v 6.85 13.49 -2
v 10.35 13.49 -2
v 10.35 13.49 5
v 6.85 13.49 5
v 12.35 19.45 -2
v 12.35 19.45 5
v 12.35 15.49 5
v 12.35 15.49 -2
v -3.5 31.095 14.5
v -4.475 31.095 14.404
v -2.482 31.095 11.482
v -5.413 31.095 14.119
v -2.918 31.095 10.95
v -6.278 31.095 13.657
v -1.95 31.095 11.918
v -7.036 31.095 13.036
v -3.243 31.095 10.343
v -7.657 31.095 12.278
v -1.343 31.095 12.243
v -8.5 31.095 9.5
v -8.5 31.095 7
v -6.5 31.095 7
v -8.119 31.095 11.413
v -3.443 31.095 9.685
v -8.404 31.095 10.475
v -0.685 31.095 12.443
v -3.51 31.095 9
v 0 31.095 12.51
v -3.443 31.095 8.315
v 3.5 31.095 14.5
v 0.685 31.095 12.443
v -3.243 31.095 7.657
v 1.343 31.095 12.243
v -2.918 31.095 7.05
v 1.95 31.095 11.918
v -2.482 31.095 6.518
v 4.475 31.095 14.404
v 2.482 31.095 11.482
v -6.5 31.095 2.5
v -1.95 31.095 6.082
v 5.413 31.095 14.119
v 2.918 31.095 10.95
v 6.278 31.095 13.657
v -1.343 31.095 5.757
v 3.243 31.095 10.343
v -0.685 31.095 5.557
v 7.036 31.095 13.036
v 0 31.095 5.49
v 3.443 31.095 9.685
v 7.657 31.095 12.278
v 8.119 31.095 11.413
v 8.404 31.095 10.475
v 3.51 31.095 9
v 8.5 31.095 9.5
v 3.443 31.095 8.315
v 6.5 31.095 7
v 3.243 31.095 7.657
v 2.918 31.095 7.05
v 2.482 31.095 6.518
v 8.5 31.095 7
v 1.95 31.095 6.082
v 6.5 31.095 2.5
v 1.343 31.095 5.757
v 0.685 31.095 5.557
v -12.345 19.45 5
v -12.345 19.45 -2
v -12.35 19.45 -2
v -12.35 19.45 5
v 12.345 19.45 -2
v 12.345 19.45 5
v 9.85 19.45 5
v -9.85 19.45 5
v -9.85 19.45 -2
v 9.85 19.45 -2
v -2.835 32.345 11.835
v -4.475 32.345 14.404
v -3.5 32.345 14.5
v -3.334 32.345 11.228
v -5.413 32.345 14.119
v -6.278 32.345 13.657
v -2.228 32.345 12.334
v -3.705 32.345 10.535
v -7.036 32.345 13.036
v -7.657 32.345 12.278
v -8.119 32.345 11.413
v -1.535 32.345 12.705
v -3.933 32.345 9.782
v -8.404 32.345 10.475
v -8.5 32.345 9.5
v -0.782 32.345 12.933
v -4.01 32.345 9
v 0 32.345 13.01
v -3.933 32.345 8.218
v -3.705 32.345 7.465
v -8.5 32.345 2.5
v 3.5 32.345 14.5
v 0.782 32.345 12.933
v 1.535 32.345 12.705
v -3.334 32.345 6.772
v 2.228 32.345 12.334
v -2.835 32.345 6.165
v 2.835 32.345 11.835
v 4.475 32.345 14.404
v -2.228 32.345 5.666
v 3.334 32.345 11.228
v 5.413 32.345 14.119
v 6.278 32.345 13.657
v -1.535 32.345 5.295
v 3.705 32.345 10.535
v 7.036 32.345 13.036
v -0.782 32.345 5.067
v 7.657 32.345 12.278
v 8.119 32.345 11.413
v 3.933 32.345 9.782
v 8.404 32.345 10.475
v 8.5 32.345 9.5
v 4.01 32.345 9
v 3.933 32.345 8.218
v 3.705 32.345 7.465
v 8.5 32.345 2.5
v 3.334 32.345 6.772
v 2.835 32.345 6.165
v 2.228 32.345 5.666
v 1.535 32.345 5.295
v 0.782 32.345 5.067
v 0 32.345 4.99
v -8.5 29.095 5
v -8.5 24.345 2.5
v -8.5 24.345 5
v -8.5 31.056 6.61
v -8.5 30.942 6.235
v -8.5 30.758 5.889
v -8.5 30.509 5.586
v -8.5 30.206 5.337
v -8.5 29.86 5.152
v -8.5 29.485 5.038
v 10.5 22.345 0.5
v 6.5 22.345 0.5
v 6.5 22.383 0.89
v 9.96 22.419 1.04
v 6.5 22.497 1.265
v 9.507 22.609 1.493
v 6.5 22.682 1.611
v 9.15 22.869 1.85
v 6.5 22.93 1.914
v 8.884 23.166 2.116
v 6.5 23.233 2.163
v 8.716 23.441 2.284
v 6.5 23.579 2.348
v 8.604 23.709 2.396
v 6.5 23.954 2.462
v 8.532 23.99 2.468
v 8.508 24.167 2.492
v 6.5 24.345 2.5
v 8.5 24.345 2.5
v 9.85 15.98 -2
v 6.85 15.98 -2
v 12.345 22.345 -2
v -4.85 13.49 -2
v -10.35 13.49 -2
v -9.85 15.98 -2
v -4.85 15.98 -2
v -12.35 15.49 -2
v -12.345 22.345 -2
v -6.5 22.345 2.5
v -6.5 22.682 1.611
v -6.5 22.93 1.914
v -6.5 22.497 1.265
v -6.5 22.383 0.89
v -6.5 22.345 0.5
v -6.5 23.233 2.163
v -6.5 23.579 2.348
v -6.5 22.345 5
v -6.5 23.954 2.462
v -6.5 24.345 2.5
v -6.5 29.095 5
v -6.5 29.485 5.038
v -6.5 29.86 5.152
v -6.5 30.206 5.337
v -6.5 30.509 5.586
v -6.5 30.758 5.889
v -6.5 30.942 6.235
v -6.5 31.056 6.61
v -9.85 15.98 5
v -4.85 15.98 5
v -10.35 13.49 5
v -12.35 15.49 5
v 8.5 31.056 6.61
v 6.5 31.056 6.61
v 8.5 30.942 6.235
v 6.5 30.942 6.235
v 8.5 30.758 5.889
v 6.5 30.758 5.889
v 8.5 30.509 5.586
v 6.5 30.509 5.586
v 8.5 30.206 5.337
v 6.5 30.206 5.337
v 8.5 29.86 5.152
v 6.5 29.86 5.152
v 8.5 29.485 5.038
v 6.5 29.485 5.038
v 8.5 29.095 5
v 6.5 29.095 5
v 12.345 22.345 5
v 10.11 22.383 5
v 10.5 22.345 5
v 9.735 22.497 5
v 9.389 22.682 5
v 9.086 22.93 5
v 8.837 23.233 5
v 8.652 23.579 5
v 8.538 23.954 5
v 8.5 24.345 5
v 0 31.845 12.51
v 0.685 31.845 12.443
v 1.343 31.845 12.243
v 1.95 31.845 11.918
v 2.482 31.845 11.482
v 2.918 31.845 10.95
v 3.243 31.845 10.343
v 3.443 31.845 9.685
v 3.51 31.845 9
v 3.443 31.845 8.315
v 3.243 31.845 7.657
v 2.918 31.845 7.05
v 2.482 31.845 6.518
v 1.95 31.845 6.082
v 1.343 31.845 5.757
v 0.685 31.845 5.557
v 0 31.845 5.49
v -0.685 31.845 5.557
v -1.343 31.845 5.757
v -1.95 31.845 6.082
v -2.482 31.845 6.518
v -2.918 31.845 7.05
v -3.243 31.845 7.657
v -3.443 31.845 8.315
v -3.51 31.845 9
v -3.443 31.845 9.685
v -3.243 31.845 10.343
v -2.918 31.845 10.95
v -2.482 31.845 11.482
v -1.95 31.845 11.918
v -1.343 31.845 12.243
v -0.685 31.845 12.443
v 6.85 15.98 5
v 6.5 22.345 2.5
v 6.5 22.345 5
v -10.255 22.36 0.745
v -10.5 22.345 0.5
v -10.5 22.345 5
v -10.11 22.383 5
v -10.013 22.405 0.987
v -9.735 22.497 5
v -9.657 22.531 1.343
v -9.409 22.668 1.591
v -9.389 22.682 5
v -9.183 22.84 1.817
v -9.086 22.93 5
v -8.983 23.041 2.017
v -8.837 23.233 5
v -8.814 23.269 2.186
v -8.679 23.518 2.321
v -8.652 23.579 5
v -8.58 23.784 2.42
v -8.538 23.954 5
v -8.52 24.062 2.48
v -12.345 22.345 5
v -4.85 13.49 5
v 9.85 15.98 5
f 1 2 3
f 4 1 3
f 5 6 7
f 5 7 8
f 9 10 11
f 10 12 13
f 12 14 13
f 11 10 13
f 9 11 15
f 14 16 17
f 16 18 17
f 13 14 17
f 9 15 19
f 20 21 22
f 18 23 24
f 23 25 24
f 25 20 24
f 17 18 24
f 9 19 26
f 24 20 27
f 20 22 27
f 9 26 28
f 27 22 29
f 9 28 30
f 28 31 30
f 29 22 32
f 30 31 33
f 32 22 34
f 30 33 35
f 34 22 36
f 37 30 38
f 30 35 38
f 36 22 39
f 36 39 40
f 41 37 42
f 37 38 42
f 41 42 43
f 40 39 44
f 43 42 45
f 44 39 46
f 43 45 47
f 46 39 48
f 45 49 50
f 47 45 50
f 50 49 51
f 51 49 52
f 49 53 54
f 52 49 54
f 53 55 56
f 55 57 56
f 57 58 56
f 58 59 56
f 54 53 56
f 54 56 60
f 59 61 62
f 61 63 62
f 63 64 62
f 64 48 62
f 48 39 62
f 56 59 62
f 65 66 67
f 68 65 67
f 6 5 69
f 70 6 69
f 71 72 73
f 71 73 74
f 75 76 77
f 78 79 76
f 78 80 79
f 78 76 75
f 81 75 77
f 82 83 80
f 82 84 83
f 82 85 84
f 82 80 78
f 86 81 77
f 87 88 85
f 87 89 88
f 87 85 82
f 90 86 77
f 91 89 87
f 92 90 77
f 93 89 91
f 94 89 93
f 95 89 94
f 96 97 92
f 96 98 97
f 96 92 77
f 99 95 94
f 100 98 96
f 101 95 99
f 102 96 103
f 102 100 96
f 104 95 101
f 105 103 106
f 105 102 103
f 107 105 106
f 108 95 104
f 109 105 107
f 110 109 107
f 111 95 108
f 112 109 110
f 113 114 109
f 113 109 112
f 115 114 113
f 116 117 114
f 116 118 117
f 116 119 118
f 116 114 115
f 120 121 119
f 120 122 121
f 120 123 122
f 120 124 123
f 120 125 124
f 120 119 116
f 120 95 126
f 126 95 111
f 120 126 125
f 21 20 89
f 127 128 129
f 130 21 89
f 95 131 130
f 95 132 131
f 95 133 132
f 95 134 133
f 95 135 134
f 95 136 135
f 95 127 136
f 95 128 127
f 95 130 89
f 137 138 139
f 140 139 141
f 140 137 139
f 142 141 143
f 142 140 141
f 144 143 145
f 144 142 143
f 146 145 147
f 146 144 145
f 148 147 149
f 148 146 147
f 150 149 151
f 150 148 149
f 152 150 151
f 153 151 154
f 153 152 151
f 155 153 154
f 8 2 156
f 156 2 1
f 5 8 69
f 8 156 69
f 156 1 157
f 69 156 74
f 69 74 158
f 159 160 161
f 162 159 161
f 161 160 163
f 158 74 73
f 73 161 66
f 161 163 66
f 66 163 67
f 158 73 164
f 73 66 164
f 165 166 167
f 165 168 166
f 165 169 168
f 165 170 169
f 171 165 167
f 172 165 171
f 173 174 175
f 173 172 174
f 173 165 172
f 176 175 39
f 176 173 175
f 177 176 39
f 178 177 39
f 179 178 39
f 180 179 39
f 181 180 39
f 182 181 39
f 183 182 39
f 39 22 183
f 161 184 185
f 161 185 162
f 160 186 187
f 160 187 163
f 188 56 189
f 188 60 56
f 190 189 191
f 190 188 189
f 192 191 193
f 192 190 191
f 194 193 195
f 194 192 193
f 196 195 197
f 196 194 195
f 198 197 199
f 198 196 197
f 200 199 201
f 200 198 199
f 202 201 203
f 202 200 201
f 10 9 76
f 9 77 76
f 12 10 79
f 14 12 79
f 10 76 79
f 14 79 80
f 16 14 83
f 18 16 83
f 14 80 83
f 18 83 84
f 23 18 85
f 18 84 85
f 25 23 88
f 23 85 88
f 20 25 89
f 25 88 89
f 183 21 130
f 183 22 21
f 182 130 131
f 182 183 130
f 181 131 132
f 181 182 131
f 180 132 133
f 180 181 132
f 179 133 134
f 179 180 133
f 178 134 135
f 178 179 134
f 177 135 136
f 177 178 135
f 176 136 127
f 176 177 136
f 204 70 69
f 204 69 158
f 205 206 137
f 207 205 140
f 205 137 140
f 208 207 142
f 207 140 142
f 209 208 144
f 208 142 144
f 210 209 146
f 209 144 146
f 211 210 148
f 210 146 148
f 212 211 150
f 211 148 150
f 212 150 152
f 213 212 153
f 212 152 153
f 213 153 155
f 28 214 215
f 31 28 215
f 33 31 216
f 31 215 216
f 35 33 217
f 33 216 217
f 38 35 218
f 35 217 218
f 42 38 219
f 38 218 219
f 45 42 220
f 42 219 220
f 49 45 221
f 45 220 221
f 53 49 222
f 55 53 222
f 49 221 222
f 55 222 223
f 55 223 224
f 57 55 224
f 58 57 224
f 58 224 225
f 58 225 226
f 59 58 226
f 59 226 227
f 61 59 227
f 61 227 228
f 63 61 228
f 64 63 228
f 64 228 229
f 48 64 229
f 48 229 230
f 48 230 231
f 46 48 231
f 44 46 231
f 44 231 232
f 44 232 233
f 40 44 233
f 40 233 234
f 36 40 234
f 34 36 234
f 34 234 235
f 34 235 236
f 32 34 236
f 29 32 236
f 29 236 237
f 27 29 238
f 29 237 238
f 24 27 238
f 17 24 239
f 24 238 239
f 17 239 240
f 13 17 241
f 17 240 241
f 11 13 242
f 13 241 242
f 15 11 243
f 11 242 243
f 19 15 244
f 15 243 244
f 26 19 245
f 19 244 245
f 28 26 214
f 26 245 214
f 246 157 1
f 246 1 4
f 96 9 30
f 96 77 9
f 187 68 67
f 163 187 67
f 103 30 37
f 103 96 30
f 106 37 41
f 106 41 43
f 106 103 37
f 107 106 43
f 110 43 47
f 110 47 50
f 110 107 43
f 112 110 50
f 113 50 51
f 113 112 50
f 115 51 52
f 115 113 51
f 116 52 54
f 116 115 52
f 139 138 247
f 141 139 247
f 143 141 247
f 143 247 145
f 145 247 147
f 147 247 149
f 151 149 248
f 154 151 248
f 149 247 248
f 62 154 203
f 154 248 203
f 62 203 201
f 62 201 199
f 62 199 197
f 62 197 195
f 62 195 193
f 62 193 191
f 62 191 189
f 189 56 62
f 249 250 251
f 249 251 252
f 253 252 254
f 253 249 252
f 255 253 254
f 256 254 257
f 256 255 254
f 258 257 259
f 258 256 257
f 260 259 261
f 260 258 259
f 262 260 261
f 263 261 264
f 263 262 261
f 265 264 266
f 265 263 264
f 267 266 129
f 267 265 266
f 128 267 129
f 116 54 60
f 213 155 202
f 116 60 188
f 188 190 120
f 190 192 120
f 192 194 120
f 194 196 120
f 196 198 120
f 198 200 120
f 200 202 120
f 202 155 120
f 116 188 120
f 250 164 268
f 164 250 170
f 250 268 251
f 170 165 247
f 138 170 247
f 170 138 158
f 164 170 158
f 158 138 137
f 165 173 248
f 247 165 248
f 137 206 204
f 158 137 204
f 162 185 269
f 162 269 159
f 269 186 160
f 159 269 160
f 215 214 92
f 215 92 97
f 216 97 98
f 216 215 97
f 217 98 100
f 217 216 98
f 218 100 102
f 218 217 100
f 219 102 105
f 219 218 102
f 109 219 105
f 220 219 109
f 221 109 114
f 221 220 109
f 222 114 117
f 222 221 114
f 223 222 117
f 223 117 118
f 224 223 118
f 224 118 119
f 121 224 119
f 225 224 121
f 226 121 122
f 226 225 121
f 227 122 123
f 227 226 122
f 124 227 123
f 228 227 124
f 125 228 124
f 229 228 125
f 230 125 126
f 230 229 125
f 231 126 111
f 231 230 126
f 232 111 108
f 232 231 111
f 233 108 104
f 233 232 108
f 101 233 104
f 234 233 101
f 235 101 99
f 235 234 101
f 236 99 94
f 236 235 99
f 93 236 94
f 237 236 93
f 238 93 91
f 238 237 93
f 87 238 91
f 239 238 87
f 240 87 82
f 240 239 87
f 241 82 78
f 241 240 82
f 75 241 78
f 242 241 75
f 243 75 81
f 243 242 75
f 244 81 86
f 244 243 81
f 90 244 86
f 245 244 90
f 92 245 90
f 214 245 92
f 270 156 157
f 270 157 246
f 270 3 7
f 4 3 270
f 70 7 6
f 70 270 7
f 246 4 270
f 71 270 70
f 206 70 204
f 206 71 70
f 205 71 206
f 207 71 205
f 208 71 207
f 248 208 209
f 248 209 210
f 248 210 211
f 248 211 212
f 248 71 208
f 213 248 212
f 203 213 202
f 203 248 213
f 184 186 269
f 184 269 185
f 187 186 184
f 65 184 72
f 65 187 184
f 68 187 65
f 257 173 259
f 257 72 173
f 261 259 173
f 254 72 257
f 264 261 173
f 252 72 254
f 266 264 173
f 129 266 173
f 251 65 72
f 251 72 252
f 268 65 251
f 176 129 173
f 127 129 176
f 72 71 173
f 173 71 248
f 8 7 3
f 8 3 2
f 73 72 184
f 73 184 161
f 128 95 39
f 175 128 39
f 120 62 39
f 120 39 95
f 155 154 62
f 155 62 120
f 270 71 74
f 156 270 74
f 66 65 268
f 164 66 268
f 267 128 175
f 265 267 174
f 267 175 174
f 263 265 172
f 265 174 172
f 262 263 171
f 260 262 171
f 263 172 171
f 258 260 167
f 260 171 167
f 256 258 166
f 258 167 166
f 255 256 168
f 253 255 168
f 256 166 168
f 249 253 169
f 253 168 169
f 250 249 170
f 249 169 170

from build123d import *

# Parameters (mm, degrees)
SKETCH2_W           = 24.690663142
SKETCH2_H           = 2.894566797
BOSS_EXTRUDE2_DEPTH = 5
SKETCH2_2_W         = 24.690663142
SKETCH2_2_H         = 2.894566797
BOSS_EXTRUDE3_DEPTH = 2
SKETCH8_W           = 2.5
SKETCH8_H           = 7
BOSS_EXTRUDE4_DEPTH = 5.96
SKETCH10_W          = 7
SKETCH10_H          = 2.49
BOSS_EXTRUDE5_DEPTH = 3
SKETCH11_W          = 7
SKETCH11_H          = 2.49
BOSS_EXTRUDE6_DEPTH = 5
SKETCH12_W          = 17
SKETCH12_H          = 2.5
BOSS_EXTRUDE7_DEPTH = 10
CUT_EXTRUDE7_REACH  = 37.323
SKETCH14_W          = 13
SKETCH14_H          = 8.75
SKETCH16_W          = 17
SKETCH16_H          = 1.25
BOSS_EXTRUDE8_DEPTH = 9.5
CUT_EXTRUDE8_REACH  = 28.801
SKETCH17_R          = 3.51
FILLET7_R           = 2
FILLET8_R           = 5
FILLET9_R           = 5
CHAMFER1_SIZE       = 2
CHAMFER2_SIZE       = 2
FILLET11_R          = 2
FILLET12_R          = 2
FILLET13_R          = 2
FILLET14_R          = 2
FILLET16_R          = 2
CHAMFER3_SIZE       = 0.5


with BuildPart() as part:
    # Sketch2 → Boss-Extrude2 (new body)
    with BuildSketch(Plane.XY):
        with Locations((0, 20.897290887)):
            Rectangle(SKETCH2_W, SKETCH2_H)
    extrude(amount=BOSS_EXTRUDE2_DEPTH)

    # Sketch2<2> → Boss-Extrude3 (add)
    with BuildSketch(Plane.XY):
        with Locations((0, 20.897290887)):
            Rectangle(SKETCH2_2_W, SKETCH2_2_H)
    extrude(amount=-BOSS_EXTRUDE3_DEPTH)

    # Sketch8 → Boss-Extrude4 (add)
    with BuildSketch(Plane(origin=(0, 19.450007488, 0), x_dir=(-1, 0, 0), z_dir=(0, -1, 0))):
        with Locations((11.1, -1.5)):
            Rectangle(SKETCH8_W, SKETCH8_H)
        with Locations((-11.1, -1.5)):
            Rectangle(SKETCH8_W, SKETCH8_H)
    extrude(amount=BOSS_EXTRUDE4_DEPTH)

    # Sketch10 → Boss-Extrude5 (add)
    with BuildSketch(Plane.ZY.offset(-9.85)):
        with Locations((1.5, 14.735007488)):
            Rectangle(SKETCH10_W, SKETCH10_H)
    extrude(amount=BOSS_EXTRUDE5_DEPTH)

    # Sketch11 → Boss-Extrude6 (add)
    with BuildSketch(Plane(origin=(-9.85, 0, 0), x_dir=(0, 0, -1), z_dir=(1, 0, 0))):
        with Locations((-1.5, 14.735007488)):
            Rectangle(SKETCH11_W, SKETCH11_H)
    extrude(amount=BOSS_EXTRUDE6_DEPTH)

    # Sketch12 → Boss-Extrude7 (add)
    with BuildSketch(Plane(origin=(0, 22.344574285, 0), x_dir=(1, 0, 0), z_dir=(0, 1, 0))):
        with Locations((0, -3.75)):
            Rectangle(SKETCH12_W, SKETCH12_H)
    extrude(amount=BOSS_EXTRUDE7_DEPTH)

    # Sketch14 → Cut-Extrude7 (cut, up to next)
    with BuildSketch(Plane.XY.offset(5), mode=Mode.PRIVATE) as cut_extrude7_sk1:
        with Locations((0, 26.719574285)):
            Rectangle(SKETCH14_W, SKETCH14_H)
    cut_extrude7_tool1 = extrude(cut_extrude7_sk1.sketch, amount=-CUT_EXTRUDE7_REACH, mode=Mode.PRIVATE) & part.part
    add(cut_extrude7_tool1.solids().sort_by_distance((0, 26.719574, 5))[0], mode=Mode.SUBTRACT)

    # Sketch16 → Boss-Extrude8 (add)
    with BuildSketch(Plane.XY.offset(5)):
        with Locations((0, 31.719574285)):
            Rectangle(SKETCH16_W, SKETCH16_H)
    extrude(amount=BOSS_EXTRUDE8_DEPTH)

    # Sketch17 → Cut-Extrude8 (cut, up to next)
    with BuildSketch(Plane(origin=(0, 32.344574285, 0), x_dir=(1, 0, 0), z_dir=(0, 1, 0)), mode=Mode.PRIVATE) as cut_extrude8_sk1:
        with Locations((0, -9)):
            Circle(SKETCH17_R)
    cut_extrude8_tool1 = extrude(cut_extrude8_sk1.sketch, amount=-CUT_EXTRUDE8_REACH, mode=Mode.PRIVATE) & part.part
    add(cut_extrude8_tool1.solids().sort_by_distance((0, 32.344574, 9))[0], mode=Mode.SUBTRACT)

    # Fillet7
    fillet7_edges = [part.edges().sort_by_distance(p)[0] for p in [
        (7.5, 31.094574285, 5),
    ]]
    fillet(fillet7_edges, radius=FILLET7_R)

    # Fillet8
    fillet8_edges = [part.edges().sort_by_distance(p)[0] for p in [
        (8.5, 31.719574285, 14.5),
    ]]
    fillet(fillet8_edges, radius=FILLET8_R)

    # Fillet9
    fillet9_edges = [part.edges().sort_by_distance(p)[0] for p in [
        (-8.5, 31.719574285, 14.5),
    ]]
    fillet(fillet9_edges, radius=FILLET9_R)

    # Chamfer1
    chamfer1_edges = [part.edges().sort_by_distance(p)[0] for p in [
        (-12.35, 13.490007488, 1.5),
    ]]
    chamfer(chamfer1_edges, length=CHAMFER1_SIZE)

    # Chamfer2
    chamfer2_edges = [part.edges().sort_by_distance(p)[0] for p in [
        (12.35, 13.490007488, 1.5),
    ]]
    chamfer(chamfer2_edges, length=CHAMFER2_SIZE)

    # Fillet11
    fillet11_edges = [part.edges().sort_by_distance(p)[0] for p in [
        (-8.5, 22.344574285, 3.75),
    ]]
    fillet(fillet11_edges, radius=FILLET11_R)

    # Fillet12
    fillet12_edges = [part.edges().sort_by_distance(p)[0] for p in [
        (8.5, 22.344574285, 3.75),
    ]]
    fillet(fillet12_edges, radius=FILLET12_R)

    # Fillet13
    fillet13_edges = [part.edges().sort_by_distance(p)[0] for p in [
        (8.5, 22.344574285, 2.5),
    ]]
    fillet(fillet13_edges, radius=FILLET13_R)

    # Fillet14
    fillet14_edges = [part.edges().sort_by_distance(p)[0] for p in [
        (-8.5, 22.344574285, 2.5),
    ]]
    fillet(fillet14_edges, radius=FILLET14_R)

    # Fillet16
    fillet16_edges = [part.edges().sort_by_distance(p)[0] for p in [
        (-7.5, 31.094574285, 5),
    ]]
    fillet(fillet16_edges, radius=FILLET16_R)

    # Chamfer3
    chamfer3_edges = [part.edges().sort_by_distance(p)[0] for p in [
        (-3.51, 32.344574285, 9),
    ]]
    chamfer(chamfer3_edges, length=CHAMFER3_SIZE)


solid = part.part
